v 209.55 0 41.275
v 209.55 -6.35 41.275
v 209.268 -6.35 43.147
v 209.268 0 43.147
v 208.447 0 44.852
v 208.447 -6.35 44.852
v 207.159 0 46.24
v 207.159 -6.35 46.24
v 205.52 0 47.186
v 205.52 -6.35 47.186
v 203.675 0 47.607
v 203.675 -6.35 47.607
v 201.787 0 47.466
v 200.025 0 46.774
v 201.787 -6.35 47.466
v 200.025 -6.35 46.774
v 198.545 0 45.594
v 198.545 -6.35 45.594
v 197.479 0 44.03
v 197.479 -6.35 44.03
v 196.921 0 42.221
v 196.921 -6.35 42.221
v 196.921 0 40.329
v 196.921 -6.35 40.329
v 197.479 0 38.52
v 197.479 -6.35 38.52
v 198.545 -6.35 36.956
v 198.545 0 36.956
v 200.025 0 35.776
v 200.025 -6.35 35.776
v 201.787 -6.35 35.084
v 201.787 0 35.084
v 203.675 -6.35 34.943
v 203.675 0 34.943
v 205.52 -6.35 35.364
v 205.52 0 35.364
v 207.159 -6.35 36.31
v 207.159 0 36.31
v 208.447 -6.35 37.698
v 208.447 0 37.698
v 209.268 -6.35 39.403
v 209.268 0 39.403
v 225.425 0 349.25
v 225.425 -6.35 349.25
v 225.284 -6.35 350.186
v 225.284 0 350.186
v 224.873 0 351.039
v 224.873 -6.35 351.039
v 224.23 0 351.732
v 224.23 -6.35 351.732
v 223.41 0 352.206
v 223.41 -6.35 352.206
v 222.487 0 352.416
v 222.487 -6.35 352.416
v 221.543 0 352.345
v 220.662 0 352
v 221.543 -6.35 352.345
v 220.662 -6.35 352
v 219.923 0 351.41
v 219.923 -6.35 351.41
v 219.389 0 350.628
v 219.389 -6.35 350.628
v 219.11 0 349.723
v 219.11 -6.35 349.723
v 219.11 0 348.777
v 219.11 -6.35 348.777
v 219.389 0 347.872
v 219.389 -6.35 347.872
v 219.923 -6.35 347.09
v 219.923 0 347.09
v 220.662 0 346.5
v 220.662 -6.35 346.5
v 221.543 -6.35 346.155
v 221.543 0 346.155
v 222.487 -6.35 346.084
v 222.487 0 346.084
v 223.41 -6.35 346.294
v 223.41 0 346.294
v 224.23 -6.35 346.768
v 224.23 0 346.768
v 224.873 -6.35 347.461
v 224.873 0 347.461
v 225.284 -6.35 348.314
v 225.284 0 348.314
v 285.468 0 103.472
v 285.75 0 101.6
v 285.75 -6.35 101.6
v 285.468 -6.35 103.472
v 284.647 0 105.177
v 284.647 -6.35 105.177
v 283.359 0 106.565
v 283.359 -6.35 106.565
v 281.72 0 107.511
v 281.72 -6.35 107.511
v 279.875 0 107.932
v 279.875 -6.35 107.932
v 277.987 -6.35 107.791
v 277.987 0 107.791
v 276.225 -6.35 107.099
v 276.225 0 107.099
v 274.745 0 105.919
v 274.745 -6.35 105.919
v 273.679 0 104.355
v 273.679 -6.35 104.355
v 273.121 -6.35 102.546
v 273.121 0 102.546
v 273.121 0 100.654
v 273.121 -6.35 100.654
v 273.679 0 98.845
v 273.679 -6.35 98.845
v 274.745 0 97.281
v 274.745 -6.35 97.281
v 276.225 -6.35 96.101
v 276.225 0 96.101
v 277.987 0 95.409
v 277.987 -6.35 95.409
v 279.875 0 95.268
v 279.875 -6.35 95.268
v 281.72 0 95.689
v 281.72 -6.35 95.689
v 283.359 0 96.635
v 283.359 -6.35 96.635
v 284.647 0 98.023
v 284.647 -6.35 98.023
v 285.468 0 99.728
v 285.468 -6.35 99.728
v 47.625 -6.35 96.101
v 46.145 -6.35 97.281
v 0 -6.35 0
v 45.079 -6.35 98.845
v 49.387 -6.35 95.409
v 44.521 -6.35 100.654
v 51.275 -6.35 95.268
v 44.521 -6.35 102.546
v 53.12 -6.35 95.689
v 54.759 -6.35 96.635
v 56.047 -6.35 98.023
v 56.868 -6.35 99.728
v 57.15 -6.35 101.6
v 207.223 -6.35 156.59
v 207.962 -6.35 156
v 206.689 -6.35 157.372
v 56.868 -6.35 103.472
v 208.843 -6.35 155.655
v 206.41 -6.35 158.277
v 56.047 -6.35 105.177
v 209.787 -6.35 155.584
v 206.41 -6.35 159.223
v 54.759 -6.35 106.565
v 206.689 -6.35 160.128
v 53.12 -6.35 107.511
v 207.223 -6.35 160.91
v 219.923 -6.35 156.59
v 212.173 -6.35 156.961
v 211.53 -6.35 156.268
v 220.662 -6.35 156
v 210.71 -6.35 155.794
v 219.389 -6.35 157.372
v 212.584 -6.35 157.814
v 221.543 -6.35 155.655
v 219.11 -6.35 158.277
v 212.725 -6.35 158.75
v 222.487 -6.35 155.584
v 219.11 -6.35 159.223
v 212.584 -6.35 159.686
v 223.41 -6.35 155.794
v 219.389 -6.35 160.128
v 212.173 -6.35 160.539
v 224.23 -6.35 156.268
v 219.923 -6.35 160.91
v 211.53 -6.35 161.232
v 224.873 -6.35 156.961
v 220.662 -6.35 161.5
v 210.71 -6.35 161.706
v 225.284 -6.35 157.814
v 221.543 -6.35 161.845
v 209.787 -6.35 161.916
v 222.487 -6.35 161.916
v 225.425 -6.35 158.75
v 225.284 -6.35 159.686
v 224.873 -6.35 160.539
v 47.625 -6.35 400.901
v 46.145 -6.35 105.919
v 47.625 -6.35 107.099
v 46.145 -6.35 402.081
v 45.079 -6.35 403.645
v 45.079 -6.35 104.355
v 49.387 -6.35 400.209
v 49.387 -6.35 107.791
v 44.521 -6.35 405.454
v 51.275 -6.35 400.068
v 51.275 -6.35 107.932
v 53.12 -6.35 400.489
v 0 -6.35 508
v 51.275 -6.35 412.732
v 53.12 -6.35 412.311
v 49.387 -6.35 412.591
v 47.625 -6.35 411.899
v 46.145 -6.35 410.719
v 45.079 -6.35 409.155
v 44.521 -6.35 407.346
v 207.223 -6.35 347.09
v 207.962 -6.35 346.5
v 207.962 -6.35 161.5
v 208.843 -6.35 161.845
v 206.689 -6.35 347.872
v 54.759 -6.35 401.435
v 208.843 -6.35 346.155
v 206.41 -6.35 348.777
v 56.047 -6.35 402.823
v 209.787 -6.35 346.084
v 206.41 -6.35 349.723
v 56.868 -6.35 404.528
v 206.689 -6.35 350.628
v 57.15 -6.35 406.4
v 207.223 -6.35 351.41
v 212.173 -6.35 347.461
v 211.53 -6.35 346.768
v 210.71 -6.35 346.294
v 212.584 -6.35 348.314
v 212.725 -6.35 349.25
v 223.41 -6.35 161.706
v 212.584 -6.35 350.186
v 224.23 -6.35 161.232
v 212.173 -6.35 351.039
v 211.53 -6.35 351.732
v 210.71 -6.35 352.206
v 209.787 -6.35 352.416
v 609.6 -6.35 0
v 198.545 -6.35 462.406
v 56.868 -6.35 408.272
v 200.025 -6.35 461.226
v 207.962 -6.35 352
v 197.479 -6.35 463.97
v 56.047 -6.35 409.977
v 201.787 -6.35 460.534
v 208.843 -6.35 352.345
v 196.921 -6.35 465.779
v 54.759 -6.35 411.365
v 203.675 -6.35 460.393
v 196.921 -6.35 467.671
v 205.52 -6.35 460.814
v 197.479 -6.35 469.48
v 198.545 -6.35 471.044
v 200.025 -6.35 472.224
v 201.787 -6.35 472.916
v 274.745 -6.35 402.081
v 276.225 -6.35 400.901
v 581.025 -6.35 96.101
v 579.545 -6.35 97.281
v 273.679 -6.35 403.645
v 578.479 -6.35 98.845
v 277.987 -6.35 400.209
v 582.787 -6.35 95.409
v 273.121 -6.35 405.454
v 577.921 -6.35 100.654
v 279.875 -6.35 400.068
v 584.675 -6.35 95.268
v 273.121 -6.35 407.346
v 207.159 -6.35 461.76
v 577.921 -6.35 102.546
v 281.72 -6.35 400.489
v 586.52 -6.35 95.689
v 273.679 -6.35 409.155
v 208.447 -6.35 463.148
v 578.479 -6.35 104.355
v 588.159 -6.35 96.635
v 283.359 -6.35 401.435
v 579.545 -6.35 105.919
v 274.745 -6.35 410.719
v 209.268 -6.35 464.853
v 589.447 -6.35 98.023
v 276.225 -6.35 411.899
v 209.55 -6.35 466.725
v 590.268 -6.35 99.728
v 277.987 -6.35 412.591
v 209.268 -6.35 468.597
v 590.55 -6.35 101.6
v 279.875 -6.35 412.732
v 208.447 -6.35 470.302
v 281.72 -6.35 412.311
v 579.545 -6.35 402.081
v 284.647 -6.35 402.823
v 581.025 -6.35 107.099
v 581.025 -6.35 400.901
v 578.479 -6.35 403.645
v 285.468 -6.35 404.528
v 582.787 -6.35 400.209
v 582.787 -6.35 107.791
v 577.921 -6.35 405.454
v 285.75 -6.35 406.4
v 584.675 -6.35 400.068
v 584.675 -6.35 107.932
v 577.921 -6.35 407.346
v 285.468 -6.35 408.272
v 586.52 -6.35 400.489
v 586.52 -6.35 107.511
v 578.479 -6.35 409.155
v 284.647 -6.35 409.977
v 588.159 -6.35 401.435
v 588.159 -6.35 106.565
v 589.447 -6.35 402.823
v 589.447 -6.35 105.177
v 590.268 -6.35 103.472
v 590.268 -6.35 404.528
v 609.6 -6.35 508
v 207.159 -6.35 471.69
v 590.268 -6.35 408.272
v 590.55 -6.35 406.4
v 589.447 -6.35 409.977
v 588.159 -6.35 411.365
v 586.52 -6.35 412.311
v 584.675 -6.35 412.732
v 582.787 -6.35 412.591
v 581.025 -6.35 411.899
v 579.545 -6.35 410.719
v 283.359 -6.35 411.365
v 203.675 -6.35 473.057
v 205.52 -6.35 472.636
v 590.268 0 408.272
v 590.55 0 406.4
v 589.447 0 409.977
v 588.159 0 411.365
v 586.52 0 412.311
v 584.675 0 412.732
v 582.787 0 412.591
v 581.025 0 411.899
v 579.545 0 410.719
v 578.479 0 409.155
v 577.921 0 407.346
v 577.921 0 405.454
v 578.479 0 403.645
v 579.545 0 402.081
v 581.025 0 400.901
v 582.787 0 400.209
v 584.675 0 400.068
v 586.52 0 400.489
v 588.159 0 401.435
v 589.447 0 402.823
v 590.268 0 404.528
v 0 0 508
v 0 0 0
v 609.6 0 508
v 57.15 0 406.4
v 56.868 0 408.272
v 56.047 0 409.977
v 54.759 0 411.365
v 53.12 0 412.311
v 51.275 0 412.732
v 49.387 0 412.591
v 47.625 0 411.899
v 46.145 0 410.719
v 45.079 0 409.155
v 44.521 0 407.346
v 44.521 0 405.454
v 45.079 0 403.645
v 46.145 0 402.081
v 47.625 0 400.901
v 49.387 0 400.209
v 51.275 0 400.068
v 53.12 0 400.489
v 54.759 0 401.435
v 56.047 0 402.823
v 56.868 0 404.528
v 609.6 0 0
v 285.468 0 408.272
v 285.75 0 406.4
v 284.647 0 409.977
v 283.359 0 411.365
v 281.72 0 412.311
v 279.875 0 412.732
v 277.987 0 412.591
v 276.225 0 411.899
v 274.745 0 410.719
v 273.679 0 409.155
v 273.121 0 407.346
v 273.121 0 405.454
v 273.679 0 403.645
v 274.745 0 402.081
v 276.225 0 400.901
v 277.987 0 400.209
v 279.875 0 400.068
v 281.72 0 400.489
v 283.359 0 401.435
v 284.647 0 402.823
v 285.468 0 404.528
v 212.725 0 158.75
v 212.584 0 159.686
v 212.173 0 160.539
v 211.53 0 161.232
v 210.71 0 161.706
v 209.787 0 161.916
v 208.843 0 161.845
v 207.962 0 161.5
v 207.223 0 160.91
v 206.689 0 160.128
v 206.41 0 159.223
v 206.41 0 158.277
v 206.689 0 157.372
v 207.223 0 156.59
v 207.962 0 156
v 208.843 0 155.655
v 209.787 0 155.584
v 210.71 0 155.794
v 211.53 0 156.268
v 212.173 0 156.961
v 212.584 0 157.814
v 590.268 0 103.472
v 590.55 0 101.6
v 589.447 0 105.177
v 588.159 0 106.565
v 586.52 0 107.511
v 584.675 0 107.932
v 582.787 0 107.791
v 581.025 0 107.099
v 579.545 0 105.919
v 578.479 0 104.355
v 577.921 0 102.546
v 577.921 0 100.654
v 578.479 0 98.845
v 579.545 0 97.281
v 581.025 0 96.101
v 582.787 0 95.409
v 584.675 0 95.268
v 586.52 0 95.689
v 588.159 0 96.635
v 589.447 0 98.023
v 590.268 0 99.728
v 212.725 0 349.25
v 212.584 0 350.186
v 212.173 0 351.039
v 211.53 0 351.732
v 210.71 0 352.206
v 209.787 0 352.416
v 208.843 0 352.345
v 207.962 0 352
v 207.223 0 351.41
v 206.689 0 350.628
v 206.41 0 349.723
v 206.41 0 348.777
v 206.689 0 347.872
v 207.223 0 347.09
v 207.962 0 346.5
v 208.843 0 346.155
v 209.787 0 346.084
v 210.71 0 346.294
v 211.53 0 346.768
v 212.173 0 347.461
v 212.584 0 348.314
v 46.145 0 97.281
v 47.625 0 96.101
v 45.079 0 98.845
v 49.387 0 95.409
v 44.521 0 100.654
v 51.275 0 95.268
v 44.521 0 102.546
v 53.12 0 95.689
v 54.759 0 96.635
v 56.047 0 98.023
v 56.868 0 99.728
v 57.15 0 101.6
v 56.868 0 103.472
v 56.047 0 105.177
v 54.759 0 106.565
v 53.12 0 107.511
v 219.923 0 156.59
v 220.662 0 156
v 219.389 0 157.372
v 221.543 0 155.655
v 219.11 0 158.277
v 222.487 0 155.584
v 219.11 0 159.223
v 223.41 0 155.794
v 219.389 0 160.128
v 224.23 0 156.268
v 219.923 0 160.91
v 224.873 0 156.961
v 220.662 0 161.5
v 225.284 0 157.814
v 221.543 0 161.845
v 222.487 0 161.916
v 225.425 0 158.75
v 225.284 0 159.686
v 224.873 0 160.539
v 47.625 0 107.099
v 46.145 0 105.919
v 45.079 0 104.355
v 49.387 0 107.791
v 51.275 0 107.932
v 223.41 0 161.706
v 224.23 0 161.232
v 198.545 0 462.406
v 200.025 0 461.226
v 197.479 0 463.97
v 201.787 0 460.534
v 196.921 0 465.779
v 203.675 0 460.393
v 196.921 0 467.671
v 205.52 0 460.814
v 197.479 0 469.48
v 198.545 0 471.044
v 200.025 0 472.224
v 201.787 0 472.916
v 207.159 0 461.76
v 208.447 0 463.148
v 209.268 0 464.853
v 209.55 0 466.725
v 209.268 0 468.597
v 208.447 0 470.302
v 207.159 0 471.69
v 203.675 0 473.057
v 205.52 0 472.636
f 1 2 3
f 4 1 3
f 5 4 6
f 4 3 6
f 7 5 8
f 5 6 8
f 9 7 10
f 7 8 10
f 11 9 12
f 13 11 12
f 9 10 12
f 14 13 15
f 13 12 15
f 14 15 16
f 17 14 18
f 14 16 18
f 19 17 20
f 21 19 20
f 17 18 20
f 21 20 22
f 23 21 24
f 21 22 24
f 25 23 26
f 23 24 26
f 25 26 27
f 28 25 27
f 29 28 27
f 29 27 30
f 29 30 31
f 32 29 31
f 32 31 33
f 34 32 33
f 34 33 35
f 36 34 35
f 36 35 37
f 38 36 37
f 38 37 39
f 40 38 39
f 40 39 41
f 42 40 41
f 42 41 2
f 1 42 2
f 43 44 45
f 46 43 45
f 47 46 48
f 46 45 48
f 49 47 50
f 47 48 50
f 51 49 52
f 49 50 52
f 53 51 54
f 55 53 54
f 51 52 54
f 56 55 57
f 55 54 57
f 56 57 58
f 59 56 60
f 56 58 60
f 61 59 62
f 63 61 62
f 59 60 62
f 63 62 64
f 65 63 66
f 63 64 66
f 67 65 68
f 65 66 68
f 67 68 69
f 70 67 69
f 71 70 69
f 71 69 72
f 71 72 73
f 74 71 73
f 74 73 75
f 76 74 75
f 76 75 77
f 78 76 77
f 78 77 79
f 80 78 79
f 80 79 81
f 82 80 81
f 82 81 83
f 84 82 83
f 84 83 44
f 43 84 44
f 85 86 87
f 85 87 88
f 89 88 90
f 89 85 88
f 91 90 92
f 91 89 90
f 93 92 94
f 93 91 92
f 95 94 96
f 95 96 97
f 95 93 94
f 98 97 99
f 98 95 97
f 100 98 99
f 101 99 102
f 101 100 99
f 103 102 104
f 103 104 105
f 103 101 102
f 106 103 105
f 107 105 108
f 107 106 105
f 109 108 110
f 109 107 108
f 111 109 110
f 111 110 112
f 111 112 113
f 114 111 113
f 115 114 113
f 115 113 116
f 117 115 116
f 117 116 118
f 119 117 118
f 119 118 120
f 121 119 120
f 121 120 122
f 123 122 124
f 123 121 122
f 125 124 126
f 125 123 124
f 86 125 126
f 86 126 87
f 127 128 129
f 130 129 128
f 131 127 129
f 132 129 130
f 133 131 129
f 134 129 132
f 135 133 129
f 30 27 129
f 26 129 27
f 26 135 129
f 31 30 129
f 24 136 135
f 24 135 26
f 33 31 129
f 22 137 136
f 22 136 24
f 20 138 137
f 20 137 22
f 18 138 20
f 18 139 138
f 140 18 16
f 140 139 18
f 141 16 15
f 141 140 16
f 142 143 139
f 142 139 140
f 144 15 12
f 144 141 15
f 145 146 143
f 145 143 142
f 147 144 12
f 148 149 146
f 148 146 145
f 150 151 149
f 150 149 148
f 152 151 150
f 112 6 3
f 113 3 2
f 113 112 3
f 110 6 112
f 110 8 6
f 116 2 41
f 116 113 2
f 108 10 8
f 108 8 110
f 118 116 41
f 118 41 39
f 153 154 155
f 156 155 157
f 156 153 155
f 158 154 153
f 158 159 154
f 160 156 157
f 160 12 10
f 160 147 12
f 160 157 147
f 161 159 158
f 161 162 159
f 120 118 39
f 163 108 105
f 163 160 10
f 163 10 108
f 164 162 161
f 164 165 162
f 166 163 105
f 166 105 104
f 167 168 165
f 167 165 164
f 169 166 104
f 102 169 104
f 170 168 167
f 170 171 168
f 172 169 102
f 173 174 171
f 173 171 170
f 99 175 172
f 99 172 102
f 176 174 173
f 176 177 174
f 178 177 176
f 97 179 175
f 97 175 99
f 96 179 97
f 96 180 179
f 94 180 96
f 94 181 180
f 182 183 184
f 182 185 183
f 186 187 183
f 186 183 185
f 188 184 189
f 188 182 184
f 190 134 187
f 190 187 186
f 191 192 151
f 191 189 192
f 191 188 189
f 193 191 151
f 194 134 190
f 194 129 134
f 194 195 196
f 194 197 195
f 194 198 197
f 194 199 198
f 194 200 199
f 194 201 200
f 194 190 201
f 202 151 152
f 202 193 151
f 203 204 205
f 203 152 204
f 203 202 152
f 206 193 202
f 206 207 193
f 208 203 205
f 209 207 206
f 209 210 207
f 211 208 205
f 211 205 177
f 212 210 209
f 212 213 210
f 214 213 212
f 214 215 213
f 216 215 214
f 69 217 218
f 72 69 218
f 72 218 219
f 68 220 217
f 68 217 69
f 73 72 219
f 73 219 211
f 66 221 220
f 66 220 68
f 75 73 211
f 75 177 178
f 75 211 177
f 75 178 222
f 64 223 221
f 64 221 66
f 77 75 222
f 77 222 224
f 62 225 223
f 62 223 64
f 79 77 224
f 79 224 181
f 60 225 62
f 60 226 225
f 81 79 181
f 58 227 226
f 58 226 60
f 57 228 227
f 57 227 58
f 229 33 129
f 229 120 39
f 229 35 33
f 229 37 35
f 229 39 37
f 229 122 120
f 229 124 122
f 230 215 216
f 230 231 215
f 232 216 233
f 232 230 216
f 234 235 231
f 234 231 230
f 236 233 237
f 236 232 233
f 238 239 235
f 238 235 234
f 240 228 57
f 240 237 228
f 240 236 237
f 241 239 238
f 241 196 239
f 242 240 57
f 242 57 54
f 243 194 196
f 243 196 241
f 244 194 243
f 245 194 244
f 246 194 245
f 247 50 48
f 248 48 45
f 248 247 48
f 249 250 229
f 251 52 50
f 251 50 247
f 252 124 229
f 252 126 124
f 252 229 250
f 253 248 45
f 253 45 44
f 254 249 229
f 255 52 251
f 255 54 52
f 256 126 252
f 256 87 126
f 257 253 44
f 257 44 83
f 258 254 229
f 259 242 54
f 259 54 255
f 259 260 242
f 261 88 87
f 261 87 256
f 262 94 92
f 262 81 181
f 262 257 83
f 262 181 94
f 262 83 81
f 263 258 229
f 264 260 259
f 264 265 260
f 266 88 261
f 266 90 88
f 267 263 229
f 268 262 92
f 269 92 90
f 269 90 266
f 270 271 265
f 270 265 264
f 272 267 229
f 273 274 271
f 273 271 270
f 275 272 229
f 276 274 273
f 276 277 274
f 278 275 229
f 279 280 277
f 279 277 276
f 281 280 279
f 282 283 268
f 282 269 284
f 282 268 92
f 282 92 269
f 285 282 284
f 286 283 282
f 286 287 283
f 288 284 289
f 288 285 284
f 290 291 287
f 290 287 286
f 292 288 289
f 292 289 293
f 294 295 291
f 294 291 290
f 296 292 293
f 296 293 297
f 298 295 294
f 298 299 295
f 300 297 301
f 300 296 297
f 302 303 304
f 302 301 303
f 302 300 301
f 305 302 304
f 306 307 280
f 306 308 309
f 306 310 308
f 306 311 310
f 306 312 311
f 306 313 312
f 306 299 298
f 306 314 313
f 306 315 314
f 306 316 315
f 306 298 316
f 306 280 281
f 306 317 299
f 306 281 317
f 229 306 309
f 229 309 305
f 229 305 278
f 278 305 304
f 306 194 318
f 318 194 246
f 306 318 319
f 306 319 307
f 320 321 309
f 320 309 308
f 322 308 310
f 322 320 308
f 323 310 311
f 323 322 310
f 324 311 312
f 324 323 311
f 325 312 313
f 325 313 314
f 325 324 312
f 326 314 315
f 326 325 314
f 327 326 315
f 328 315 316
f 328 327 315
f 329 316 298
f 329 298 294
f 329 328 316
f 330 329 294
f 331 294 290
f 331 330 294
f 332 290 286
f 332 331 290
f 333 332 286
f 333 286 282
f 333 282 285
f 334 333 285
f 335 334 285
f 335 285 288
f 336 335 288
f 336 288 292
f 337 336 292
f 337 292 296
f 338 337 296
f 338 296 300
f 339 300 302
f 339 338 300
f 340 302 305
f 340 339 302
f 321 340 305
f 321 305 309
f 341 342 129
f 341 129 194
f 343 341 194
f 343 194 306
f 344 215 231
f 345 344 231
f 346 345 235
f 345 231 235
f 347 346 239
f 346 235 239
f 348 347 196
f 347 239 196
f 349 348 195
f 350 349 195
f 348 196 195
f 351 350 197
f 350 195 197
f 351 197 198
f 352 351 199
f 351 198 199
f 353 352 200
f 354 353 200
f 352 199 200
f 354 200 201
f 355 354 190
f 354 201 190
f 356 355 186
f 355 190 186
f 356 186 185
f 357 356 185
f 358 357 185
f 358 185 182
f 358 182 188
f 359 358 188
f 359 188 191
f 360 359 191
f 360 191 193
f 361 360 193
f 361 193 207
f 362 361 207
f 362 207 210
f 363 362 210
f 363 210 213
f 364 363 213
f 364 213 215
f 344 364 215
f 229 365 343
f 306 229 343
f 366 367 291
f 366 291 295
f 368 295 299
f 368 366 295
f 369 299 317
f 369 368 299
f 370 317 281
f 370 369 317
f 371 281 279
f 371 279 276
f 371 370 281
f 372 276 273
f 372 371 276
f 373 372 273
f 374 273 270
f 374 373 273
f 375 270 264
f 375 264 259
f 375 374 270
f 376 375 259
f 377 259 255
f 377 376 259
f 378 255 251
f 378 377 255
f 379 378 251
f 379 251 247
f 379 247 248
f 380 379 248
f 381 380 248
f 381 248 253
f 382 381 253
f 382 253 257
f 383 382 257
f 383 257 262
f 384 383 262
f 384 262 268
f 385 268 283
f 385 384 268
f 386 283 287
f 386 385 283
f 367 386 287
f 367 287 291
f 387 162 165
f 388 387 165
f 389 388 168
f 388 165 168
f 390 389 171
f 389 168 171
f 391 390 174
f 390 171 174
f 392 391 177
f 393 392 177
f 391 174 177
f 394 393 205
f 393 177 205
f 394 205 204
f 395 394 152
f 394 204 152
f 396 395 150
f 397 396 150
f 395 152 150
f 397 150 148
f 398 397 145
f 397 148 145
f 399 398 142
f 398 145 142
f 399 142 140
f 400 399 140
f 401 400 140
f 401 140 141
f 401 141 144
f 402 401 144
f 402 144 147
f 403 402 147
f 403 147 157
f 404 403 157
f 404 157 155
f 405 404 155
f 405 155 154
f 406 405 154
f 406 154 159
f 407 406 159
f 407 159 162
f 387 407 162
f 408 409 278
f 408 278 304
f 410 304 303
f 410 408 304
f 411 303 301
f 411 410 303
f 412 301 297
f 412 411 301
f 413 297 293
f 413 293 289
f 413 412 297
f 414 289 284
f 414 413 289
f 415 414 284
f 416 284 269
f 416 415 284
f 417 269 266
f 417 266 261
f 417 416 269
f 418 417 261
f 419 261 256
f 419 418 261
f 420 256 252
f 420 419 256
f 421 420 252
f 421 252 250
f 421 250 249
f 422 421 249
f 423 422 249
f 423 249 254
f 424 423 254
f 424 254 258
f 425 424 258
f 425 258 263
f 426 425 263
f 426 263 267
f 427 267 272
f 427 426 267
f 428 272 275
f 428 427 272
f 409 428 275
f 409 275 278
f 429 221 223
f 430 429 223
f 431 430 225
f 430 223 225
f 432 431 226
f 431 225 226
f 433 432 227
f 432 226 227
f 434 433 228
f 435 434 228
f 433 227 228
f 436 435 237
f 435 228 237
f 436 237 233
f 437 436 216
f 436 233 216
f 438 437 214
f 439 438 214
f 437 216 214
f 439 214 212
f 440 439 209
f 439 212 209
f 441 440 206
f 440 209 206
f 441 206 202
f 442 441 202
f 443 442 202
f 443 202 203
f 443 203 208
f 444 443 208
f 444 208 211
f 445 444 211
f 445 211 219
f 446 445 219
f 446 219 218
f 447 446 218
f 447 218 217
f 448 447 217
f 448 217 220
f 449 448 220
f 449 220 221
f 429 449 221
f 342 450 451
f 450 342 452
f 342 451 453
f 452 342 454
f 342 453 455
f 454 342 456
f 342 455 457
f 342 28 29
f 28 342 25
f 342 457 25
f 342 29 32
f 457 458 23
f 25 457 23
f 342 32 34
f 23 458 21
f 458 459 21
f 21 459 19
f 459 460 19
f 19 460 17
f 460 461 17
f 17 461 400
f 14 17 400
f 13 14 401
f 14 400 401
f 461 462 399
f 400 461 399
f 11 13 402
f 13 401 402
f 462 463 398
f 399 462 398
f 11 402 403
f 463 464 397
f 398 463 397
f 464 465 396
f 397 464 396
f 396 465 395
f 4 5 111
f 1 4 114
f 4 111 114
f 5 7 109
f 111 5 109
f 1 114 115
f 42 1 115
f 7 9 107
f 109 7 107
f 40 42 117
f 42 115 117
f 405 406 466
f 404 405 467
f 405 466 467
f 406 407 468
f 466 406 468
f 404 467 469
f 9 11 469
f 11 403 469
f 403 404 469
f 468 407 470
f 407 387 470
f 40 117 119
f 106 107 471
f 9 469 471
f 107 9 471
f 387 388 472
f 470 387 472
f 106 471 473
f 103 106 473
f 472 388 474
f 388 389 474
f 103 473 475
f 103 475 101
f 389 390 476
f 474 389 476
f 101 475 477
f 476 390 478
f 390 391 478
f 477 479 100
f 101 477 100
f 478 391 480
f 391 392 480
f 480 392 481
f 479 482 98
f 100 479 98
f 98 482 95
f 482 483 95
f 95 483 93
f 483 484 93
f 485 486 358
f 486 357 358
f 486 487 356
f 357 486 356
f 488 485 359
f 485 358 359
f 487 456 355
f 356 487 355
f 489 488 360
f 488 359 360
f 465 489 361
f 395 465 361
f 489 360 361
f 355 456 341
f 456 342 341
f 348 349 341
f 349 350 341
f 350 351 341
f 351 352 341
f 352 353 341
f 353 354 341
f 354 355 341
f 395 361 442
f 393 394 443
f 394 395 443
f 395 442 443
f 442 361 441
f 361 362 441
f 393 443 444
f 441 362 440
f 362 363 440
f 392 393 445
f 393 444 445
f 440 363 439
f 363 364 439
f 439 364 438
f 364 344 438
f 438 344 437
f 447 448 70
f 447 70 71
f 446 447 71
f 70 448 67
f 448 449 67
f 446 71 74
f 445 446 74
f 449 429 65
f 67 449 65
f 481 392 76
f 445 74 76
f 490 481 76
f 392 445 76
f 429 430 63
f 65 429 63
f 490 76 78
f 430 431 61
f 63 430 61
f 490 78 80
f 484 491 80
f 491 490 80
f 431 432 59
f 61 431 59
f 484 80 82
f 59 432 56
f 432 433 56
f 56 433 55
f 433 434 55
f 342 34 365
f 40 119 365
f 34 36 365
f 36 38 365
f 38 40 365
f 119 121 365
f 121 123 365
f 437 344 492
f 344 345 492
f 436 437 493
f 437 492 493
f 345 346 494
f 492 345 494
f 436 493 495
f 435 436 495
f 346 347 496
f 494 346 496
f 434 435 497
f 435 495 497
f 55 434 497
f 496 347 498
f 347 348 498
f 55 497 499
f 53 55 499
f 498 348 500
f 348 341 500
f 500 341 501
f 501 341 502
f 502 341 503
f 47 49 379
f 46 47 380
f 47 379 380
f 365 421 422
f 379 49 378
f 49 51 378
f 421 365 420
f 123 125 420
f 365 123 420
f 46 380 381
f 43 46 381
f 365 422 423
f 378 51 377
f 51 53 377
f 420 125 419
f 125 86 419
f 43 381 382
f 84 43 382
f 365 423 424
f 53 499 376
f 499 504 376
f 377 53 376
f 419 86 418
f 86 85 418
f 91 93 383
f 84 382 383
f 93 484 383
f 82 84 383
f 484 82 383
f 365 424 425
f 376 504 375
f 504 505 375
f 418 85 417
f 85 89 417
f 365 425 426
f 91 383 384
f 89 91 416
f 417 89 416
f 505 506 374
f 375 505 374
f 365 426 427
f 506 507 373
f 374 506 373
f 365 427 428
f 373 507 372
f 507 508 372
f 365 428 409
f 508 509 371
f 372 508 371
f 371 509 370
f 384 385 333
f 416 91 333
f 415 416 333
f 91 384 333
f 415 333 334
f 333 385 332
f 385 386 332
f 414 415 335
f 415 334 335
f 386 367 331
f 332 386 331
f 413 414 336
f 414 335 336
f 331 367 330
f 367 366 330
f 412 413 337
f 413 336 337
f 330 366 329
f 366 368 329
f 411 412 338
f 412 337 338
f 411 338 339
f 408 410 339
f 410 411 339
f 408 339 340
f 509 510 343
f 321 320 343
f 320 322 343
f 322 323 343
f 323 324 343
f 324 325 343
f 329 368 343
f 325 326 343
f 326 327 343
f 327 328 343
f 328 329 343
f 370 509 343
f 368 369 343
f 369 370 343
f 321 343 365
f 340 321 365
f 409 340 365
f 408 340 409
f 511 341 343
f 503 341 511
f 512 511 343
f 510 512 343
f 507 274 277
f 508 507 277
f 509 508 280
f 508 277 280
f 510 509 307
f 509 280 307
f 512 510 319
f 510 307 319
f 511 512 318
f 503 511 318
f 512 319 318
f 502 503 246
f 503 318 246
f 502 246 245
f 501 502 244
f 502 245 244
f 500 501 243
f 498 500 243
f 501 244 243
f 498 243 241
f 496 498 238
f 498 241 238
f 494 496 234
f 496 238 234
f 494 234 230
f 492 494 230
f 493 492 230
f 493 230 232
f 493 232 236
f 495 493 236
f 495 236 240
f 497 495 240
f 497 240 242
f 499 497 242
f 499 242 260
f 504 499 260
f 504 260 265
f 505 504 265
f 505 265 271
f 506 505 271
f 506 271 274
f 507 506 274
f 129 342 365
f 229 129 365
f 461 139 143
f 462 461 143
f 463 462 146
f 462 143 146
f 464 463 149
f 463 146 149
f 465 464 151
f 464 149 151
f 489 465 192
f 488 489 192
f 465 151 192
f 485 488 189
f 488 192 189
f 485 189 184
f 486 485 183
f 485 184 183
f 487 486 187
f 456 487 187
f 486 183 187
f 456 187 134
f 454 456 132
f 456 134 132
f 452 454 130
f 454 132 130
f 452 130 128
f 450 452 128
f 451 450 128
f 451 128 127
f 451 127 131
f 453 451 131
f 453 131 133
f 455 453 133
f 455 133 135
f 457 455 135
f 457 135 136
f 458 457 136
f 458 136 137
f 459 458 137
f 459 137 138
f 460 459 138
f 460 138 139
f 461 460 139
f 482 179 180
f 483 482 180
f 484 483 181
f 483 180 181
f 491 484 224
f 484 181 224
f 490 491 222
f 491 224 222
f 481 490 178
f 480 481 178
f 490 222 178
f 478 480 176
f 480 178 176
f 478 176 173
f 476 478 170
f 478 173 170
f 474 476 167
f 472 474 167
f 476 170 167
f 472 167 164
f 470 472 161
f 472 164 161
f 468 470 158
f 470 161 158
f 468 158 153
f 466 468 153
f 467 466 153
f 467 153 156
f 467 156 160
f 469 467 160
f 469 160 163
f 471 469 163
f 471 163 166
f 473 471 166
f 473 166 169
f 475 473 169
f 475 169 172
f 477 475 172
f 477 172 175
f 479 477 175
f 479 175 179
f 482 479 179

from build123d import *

# Parameters (mm, degrees)
F0_W     = 609.6
F0_H     = 508
F0_R     = 6.35
F1_DEPTH = 6.35
F2_R     = 3.175
F3_DEPTH = 25.4
F4_R     = 6.35
F5_DEPTH = 25.4
F6_R     = 6.35
F7_DEPTH = 25.4


with BuildPart() as f1:
    # F0 (on Front) → F1 (new body)
    with BuildSketch(Plane.XZ):
        with Locations((304.8, 254)):
            Rectangle(F0_W, F0_H)
        with Locations((279.4, 101.6)):
            Circle(F0_R, mode=Mode.SUBTRACT)
        with Locations((584.2, 101.6)):
            Circle(F0_R, mode=Mode.SUBTRACT)
        with Locations((279.4, 406.4)):
            Circle(F0_R, mode=Mode.SUBTRACT)
        with Locations((584.2, 406.4)):
            Circle(F0_R, mode=Mode.SUBTRACT)
    extrude(amount=F1_DEPTH)

    # F2 (on face) → F3 (cut)
    with BuildSketch(Plane.XZ.offset(6.35)):
        with Locations((209.55, 158.75)):
            Circle(F2_R)
        with Locations((222.25, 158.75)):
            Circle(F2_R)
        with Locations((209.55, 349.25)):
            Circle(F2_R)
        with Locations((222.25, 349.25)):
            Circle(F2_R)
    extrude(amount=-F3_DEPTH, mode=Mode.SUBTRACT)

    # F4 (on face) → F5 (cut)
    with BuildSketch(Plane.XZ.offset(6.35)):
        with Locations((50.8, 406.4)):
            Circle(F4_R)
        with Locations((50.8, 101.6)):
            Circle(F4_R)
    extrude(amount=-F5_DEPTH, mode=Mode.SUBTRACT)

    # F6 (on face) → F7 (cut)
    with BuildSketch(Plane.XZ.offset(6.35)):
        with Locations((203.2, 41.275)):
            Circle(F6_R)
        with Locations((203.2, 466.725)):
            Circle(F6_R)
    extrude(amount=-F7_DEPTH, mode=Mode.SUBTRACT)


solid = f1.part
